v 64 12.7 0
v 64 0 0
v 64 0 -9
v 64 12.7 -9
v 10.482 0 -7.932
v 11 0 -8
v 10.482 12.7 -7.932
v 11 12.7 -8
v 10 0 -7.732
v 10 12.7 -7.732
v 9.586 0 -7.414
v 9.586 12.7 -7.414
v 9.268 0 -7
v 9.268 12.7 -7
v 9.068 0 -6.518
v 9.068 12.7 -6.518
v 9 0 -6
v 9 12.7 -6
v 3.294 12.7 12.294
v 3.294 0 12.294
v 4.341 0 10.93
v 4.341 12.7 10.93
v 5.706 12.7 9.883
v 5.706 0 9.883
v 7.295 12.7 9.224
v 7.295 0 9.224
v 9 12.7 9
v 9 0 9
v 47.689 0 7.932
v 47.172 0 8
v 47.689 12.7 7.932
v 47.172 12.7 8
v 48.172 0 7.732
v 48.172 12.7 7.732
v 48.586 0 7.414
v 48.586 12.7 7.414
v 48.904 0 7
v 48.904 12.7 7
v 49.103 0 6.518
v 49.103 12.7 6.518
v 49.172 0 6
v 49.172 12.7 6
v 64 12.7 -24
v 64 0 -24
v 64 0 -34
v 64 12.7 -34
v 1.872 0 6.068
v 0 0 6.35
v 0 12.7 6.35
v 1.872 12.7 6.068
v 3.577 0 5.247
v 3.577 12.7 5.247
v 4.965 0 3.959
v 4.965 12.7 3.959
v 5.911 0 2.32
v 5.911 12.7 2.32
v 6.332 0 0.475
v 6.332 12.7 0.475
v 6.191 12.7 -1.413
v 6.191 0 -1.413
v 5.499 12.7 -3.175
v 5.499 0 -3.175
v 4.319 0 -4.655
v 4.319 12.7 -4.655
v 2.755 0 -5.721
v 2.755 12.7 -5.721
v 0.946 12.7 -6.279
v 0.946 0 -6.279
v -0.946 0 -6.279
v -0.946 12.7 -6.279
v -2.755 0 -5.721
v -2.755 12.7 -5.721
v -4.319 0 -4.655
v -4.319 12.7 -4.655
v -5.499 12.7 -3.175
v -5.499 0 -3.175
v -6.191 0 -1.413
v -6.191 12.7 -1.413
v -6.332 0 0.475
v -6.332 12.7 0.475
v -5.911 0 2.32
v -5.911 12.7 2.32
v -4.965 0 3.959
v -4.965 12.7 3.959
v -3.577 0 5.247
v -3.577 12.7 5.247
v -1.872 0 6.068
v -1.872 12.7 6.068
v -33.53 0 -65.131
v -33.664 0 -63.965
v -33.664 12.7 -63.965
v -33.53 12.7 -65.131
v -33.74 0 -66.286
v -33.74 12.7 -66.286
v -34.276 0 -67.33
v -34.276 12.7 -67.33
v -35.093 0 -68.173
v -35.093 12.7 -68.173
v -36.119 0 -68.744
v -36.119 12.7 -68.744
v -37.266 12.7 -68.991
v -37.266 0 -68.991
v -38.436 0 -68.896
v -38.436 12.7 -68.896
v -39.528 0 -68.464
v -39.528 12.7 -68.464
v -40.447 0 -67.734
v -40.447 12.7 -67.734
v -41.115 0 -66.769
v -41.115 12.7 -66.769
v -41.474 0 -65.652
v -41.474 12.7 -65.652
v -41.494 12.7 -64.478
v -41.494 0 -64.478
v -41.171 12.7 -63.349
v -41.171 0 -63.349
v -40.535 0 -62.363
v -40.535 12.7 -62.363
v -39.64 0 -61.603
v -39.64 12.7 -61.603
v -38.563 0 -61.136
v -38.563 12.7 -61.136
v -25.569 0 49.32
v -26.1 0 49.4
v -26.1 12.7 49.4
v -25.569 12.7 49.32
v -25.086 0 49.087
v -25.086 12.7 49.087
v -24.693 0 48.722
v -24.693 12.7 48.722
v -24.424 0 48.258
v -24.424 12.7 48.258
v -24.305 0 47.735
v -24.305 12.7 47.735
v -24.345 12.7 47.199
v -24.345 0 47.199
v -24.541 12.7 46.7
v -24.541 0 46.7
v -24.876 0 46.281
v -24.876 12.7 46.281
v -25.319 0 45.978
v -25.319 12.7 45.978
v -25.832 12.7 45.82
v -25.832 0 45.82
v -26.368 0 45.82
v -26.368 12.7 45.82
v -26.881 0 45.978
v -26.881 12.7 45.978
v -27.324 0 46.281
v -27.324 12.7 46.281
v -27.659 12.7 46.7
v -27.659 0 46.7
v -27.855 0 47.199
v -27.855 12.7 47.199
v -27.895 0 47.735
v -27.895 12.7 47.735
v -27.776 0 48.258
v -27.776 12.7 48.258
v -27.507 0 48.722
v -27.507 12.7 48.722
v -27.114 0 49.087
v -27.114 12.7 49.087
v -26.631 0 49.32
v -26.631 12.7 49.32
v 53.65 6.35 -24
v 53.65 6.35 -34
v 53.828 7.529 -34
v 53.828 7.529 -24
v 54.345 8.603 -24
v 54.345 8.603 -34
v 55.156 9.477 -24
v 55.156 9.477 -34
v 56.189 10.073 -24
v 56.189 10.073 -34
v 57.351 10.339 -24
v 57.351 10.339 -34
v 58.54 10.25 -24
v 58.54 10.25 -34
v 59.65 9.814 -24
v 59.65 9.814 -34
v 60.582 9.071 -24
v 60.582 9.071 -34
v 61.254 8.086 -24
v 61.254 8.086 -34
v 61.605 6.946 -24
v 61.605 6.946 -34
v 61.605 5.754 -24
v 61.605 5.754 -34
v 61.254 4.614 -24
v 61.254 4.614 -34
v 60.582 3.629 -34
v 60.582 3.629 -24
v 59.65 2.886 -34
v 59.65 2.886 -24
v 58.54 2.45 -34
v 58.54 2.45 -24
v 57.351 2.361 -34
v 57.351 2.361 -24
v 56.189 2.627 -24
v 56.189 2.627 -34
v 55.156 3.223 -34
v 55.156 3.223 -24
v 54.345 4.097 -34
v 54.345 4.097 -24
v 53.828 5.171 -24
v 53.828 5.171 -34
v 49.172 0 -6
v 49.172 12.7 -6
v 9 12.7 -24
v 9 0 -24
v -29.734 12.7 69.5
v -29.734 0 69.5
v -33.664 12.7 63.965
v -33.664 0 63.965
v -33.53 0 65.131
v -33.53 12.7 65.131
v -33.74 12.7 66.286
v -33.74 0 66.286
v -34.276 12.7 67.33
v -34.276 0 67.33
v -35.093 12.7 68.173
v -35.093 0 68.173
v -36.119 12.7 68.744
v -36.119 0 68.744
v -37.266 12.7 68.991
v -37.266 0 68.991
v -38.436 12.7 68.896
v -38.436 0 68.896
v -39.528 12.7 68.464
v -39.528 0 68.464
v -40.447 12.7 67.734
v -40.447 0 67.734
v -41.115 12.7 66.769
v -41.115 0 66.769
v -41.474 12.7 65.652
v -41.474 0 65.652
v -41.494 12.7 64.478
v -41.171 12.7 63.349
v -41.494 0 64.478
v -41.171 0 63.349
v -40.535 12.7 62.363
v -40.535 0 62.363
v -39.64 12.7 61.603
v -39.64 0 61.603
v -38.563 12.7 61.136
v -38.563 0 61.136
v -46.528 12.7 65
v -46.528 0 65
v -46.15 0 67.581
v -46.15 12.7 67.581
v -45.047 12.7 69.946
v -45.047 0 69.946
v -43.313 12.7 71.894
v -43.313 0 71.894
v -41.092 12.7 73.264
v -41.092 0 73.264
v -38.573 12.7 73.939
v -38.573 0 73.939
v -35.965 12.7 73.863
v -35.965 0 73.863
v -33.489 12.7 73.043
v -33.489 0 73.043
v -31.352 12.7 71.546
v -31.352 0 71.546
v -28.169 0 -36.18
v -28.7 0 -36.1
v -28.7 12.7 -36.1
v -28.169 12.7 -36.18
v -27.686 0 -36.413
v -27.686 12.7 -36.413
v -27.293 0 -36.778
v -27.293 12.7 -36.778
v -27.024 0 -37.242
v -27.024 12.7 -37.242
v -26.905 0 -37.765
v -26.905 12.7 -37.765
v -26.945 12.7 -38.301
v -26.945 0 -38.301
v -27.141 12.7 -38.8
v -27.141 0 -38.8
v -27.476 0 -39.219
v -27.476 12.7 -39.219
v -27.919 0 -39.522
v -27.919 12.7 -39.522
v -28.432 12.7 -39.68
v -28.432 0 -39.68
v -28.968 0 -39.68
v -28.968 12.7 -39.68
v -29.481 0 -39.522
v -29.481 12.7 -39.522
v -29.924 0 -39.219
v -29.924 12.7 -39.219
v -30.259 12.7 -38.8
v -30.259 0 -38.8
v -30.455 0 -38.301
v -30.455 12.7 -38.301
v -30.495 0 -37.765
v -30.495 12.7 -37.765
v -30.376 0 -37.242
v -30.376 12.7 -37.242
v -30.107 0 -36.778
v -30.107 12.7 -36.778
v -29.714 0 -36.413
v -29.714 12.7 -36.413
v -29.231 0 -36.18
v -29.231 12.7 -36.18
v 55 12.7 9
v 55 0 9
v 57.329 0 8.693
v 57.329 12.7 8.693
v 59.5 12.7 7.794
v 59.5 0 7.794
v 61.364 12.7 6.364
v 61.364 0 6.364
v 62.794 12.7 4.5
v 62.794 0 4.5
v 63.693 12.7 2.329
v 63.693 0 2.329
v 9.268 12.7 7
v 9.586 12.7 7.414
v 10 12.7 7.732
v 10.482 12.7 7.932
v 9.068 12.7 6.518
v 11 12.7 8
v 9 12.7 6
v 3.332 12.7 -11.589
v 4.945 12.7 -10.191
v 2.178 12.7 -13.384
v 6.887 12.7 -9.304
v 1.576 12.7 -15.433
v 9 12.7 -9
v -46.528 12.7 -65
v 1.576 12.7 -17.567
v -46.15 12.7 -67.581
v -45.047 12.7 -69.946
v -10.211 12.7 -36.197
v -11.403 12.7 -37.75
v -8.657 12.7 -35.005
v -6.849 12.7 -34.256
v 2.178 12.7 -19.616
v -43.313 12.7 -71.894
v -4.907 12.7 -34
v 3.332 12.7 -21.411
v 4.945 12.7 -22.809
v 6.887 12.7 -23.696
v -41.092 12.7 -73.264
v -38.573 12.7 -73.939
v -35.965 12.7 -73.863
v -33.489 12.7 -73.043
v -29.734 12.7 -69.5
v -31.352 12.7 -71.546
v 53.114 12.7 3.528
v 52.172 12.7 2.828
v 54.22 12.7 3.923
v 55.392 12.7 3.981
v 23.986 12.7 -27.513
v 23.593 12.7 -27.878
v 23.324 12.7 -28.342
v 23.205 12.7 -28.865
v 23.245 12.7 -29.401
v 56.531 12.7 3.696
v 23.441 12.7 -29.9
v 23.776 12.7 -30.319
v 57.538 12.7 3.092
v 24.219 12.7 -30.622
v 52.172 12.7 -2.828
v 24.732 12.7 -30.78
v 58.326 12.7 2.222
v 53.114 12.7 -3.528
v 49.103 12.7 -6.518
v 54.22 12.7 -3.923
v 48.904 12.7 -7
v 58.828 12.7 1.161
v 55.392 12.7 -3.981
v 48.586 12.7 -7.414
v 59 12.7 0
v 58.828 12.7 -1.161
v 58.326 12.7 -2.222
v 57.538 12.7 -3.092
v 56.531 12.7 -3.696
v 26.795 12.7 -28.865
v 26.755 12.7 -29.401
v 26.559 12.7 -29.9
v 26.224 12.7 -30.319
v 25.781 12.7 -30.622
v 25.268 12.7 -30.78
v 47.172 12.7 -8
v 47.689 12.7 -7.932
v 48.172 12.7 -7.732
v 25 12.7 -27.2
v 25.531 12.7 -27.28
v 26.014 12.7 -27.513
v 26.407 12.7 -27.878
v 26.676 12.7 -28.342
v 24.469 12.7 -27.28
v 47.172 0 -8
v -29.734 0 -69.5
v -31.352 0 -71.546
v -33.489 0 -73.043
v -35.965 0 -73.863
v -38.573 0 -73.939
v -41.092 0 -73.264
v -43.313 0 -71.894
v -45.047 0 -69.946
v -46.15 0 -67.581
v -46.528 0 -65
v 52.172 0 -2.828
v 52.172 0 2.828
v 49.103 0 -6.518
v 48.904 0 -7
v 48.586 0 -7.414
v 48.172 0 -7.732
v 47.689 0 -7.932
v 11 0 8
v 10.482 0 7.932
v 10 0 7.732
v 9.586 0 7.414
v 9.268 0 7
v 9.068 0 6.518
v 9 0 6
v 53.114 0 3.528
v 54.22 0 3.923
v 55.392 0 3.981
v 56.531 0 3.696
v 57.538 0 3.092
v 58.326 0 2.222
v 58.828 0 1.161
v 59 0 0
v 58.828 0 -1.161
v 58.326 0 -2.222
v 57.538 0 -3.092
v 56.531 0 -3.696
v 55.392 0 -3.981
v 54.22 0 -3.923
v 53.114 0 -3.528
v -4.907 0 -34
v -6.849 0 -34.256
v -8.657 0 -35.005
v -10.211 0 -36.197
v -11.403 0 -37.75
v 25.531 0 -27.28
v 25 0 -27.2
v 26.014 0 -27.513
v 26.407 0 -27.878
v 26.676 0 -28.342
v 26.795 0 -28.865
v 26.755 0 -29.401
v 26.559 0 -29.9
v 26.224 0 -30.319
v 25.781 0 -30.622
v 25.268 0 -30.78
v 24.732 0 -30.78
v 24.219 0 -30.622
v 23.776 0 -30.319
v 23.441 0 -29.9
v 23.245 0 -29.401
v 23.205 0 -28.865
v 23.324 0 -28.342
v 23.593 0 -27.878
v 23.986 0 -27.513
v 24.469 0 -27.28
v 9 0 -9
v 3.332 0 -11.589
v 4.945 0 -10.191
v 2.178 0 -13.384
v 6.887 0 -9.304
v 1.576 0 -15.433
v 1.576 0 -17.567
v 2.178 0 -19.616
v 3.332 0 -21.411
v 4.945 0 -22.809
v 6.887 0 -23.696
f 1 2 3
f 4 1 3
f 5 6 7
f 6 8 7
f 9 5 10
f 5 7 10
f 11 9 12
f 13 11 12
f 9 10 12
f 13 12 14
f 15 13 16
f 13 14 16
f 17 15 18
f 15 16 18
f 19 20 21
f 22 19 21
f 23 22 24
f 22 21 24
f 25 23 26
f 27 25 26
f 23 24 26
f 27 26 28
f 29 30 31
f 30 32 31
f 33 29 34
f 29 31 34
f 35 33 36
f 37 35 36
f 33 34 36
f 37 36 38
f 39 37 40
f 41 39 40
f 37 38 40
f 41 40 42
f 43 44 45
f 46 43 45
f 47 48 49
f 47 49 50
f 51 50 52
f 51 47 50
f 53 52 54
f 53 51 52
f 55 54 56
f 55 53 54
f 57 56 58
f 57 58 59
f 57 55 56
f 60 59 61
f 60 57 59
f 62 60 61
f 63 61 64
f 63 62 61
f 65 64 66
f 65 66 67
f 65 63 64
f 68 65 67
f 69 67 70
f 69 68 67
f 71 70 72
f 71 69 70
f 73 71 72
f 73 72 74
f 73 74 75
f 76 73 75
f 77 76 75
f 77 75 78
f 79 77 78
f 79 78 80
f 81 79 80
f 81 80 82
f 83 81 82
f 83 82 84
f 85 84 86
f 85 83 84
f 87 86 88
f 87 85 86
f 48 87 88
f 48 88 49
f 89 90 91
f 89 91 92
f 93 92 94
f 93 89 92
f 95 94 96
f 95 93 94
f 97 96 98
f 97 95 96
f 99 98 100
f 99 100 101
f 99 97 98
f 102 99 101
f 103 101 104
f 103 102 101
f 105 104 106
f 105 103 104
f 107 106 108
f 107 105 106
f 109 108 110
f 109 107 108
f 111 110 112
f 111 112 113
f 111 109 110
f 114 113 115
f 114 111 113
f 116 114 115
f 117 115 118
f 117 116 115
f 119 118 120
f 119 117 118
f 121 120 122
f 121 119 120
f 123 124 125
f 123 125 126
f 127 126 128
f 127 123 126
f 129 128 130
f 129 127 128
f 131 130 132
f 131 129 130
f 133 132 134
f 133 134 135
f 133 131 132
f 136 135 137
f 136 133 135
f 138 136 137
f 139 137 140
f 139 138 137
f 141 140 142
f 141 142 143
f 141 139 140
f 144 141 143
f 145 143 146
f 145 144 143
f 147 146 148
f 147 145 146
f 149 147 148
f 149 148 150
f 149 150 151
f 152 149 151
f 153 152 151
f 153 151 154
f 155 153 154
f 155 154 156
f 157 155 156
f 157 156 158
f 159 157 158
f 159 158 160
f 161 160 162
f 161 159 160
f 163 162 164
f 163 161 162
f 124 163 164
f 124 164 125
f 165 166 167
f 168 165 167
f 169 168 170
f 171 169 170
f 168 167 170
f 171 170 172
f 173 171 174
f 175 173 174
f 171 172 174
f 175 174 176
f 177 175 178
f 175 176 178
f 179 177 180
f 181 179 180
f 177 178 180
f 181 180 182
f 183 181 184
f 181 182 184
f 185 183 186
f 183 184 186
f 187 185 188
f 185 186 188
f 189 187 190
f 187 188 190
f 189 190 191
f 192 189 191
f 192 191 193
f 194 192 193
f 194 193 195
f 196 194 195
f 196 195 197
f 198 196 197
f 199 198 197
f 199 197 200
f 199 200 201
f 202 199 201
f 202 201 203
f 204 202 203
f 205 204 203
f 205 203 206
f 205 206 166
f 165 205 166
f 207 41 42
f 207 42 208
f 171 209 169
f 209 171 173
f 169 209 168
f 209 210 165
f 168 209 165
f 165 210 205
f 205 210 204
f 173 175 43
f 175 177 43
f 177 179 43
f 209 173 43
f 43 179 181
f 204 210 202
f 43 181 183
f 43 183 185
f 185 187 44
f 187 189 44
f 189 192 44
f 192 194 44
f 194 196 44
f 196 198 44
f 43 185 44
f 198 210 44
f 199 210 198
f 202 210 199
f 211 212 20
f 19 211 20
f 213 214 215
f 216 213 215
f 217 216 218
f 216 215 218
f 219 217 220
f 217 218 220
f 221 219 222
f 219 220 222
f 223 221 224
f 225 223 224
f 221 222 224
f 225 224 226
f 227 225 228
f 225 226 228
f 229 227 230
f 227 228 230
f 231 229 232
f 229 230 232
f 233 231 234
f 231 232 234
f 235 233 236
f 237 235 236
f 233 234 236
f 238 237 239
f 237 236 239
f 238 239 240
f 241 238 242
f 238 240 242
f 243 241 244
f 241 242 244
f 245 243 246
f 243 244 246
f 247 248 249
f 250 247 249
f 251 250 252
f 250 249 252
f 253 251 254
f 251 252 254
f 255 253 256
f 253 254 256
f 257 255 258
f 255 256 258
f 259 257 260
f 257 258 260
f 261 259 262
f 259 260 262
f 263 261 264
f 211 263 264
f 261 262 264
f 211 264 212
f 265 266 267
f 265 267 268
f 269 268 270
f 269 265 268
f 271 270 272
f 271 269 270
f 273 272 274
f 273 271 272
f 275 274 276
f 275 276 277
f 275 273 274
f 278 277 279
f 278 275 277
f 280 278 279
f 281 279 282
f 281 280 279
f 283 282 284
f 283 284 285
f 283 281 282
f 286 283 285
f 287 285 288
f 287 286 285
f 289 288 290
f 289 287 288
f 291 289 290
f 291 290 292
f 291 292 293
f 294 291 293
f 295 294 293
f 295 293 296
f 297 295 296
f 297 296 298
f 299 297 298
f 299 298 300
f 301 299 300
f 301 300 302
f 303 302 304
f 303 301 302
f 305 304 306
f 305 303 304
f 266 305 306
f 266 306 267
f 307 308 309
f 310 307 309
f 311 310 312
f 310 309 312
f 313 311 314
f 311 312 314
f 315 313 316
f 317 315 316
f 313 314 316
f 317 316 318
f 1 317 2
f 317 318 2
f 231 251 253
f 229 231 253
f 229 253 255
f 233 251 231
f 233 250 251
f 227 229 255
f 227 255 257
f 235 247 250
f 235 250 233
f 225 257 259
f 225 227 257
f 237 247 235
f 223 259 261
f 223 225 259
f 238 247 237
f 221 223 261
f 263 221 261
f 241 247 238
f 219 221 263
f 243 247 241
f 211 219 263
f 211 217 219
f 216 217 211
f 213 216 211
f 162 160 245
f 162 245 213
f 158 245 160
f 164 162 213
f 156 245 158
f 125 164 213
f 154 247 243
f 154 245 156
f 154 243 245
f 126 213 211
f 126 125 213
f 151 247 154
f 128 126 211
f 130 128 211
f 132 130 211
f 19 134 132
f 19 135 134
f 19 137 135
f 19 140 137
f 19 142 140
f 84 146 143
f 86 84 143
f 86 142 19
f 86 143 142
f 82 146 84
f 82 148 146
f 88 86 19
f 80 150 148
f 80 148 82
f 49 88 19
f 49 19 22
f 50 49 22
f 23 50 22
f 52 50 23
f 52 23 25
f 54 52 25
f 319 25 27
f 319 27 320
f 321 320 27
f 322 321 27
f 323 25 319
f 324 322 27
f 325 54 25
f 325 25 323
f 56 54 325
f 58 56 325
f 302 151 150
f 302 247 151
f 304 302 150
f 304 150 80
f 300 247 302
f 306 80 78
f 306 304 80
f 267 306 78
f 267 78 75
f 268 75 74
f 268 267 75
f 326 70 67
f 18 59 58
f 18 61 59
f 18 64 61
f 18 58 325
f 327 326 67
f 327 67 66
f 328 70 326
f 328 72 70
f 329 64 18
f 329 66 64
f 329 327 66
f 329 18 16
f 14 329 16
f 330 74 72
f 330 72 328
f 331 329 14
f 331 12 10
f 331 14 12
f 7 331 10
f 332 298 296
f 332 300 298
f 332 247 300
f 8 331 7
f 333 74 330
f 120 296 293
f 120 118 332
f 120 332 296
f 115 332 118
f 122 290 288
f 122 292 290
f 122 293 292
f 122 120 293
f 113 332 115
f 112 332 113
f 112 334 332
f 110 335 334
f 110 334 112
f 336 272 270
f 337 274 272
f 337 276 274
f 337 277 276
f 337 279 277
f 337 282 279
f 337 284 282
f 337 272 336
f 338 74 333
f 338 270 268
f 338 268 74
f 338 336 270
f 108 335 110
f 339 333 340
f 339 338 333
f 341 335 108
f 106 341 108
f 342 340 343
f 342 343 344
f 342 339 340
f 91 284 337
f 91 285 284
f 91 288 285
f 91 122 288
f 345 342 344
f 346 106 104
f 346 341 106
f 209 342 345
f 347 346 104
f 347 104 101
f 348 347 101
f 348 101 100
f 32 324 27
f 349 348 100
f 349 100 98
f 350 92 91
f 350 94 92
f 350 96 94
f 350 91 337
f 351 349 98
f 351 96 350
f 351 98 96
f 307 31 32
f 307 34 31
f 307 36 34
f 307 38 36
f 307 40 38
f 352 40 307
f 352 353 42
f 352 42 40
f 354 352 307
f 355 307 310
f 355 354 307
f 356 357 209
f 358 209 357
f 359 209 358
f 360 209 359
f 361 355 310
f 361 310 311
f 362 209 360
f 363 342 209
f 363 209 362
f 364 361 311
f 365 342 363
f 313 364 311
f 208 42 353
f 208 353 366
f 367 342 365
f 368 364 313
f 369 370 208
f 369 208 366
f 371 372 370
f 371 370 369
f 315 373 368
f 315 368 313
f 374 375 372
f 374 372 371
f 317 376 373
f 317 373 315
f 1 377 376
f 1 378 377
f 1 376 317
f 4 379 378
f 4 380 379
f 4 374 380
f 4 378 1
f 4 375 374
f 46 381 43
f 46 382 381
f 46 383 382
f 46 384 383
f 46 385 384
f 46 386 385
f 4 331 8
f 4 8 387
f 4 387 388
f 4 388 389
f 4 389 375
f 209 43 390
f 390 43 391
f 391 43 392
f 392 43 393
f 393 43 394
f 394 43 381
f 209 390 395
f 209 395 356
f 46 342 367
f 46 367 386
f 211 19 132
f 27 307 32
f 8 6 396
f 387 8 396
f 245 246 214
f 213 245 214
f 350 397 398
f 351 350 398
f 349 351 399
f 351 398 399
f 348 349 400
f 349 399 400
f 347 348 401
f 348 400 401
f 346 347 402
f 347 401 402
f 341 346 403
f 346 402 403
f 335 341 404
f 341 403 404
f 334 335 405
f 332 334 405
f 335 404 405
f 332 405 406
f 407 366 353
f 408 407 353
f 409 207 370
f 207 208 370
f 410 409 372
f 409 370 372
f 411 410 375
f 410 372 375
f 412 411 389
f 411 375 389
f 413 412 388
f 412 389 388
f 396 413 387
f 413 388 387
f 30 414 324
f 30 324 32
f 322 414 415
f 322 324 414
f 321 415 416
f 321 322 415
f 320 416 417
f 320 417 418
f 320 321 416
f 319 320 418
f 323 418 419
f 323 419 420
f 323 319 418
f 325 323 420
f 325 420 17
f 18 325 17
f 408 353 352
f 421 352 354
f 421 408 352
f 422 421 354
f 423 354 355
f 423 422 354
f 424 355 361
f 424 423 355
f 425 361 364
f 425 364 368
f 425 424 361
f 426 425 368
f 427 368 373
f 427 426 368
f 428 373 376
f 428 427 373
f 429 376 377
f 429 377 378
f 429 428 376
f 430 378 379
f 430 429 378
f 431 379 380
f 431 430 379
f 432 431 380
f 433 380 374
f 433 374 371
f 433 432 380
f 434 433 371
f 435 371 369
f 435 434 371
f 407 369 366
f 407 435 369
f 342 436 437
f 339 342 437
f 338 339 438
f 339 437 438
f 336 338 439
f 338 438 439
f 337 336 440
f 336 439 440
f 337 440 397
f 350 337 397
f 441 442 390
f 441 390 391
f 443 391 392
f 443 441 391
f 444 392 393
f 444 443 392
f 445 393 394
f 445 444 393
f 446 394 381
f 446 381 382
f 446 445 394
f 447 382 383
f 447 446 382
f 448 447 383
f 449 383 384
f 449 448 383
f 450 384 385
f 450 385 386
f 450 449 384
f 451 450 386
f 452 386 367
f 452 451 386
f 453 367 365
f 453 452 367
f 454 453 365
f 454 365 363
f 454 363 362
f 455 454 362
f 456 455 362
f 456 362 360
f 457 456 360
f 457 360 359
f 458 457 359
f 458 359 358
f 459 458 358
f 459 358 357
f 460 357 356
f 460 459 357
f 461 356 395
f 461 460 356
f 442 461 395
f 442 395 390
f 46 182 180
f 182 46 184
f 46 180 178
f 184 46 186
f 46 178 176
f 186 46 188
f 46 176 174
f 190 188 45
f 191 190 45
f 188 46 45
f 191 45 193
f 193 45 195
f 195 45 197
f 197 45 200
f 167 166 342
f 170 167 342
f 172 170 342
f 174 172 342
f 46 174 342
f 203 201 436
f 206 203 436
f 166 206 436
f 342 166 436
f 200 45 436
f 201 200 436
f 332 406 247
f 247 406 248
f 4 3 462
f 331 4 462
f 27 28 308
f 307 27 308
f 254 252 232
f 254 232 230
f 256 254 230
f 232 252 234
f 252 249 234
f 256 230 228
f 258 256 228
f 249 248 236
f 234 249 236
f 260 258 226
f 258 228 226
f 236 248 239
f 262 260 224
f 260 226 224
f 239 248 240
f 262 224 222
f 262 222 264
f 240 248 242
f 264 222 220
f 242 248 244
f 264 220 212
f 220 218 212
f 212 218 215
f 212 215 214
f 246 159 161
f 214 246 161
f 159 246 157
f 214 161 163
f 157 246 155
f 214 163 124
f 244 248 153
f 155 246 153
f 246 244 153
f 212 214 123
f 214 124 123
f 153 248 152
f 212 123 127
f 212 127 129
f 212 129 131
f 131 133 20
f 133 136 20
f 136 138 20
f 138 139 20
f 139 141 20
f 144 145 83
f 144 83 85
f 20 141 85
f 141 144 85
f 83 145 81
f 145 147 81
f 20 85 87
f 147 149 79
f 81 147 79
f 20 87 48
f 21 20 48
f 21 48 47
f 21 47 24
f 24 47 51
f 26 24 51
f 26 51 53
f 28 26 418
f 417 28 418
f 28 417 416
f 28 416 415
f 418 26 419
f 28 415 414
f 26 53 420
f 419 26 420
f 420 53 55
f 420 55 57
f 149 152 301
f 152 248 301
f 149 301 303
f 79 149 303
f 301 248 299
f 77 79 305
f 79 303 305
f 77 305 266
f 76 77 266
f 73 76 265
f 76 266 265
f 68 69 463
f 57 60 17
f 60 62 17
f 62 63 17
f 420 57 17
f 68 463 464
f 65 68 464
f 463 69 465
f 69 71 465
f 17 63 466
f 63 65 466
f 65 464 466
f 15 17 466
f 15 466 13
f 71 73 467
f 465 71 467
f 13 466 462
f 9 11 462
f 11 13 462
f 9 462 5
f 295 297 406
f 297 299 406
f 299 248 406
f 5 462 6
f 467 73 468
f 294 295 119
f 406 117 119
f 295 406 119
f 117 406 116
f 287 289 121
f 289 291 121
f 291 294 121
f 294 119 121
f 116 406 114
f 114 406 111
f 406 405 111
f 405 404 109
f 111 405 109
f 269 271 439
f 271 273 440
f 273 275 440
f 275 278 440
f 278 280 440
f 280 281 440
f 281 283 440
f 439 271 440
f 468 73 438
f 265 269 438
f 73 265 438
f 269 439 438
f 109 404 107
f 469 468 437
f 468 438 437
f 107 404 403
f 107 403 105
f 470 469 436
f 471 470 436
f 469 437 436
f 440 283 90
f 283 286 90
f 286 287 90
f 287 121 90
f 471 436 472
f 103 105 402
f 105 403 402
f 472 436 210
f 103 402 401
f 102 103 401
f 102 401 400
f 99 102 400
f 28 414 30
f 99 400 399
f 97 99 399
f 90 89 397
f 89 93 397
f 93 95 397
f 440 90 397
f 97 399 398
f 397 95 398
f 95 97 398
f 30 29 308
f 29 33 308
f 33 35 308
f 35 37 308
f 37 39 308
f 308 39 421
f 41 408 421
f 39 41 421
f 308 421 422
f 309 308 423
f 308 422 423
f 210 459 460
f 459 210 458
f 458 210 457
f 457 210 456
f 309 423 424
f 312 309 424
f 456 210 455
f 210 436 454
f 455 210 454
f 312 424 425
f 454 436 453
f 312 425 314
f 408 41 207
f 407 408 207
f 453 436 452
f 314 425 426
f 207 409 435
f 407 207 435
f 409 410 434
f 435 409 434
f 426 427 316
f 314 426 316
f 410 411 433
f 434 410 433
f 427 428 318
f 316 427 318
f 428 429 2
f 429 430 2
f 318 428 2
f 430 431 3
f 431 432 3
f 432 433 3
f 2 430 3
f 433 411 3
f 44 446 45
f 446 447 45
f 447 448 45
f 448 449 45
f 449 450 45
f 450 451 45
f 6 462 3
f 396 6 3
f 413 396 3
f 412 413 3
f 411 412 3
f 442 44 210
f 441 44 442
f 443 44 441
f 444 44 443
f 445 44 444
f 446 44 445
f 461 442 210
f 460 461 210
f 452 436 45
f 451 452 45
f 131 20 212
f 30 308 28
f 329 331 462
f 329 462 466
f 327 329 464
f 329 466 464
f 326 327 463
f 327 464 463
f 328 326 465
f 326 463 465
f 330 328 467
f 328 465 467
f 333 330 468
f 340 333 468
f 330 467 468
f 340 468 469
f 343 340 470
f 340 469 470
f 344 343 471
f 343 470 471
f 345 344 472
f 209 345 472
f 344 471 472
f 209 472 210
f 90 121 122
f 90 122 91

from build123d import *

# Parameters (mm, degrees)
SKETCH1_R           = 6.35
SKETCH1_R_2         = 1.8
SKETCH1_W           = 40.171572875
SKETCH1_H           = 16
BOSS_EXTRUDE1_DEPTH = 12.7
FILLET1_R           = 2
CUT_EXTRUDE1_REACH  = 128.18
SKETCH2_R           = 4


with BuildPart() as part:
    # Sketch1 → Boss-Extrude1 (new body)
    with BuildSketch(Plane(origin=(0, 0, 0), x_dir=(1, 0, 0), z_dir=(0, 1, 0))):
        with BuildLine():
            Line((64, 0), (64, 9))
            Line((64, 9), (9, 9))
            ThreePointArc((9, 9), (1.5, 16.5), (9, 24))
            Line((9, 24), (64, 24))
            Line((64, 24), (64, 34))
            Line((64, 34), (-4.907477288, 34))
            ThreePointArc((-4.907477288, 34), (-8.657477288, 35.004809472), (-11.402667816, 37.75))
            Line((-11.402667816, 37.75), (-29.733538863, 69.5))
            ThreePointArc((-29.733538863, 69.5), (-39.857138903, 73.693332437), (-46.527767497, 65))
            Line((-46.527767497, 65), (-46.527767497, -65))
            ThreePointArc((-46.527767497, -65), (-39.857138903, -73.693332437), (-29.733538863, -69.5))
            Line((-29.733538863, -69.5), (3.294228634, -12.294228634))
            ThreePointArc((3.294228634, -12.294228634), (5.705771366, -9.882685902), (9, -9))
            Line((9, -9), (55, -9))
            ThreePointArc((55, -9), (61.363961031, -6.363961031), (64, 0))
        make_face()
        with Locations(Location((0, 0, 0), (0, 0, 270))):
            Circle(SKETCH1_R, mode=Mode.SUBTRACT)
        with Locations(Location((25, 29, 0), (0, 0, 270))):
            Circle(SKETCH1_R_2, mode=Mode.SUBTRACT)
        with Locations(Location((-28.7, 37.9, 0), (0, 0, 270))):
            Circle(SKETCH1_R_2, mode=Mode.SUBTRACT)
        with Locations(Location((-26.1, -47.6, 0), (0, 0, 270))):
            Circle(SKETCH1_R_2, mode=Mode.SUBTRACT)
        with BuildLine():
            Line((52.171572875, 2.828427125), (52.171572875, -2.828427125))
            ThreePointArc((52.171572875, -2.828427125), (59, 0), (52.171572875, 2.828427125))
        make_face(mode=Mode.SUBTRACT)
        with BuildLine():
            Line((-38.563043678, 61.136296695), (-33.664064192, 63.96472382))
            ThreePointArc((-33.664064192, 63.96472382), (-39.527767497, 68.464101615), (-38.563043678, 61.136296695))
        make_face(mode=Mode.SUBTRACT)
        with BuildLine():
            Line((-38.563043678, -61.136296695), (-33.664064192, -63.96472382))
            ThreePointArc((-33.664064192, -63.96472382), (-39.527767497, -68.464101615), (-38.563043678, -61.136296695))
        make_face(mode=Mode.SUBTRACT)
        with Locations((29.085786438, 0)):
            Rectangle(SKETCH1_W, SKETCH1_H, mode=Mode.SUBTRACT)
    extrude(amount=BOSS_EXTRUDE1_DEPTH)

    # Fillet1
    fillet1_edges = [part.edges().sort_by_distance(p)[0] for p in [
        (9, 6.35, -8),
        (9, 6.35, 8),
        (49.171572875, 6.35, 8),
        (49.171572875, 6.35, -8),
    ]]
    fillet(fillet1_edges, radius=FILLET1_R)

    # Sketch2 → Cut-Extrude1 (cut, up to next)
    with BuildSketch(Plane(origin=(0, 0, -34), x_dir=(-1, 0, 0), z_dir=(0, 0, -1)), mode=Mode.PRIVATE) as cut_extrude1_sk1:
        with Locations((-57.65, 6.35)):
            Circle(SKETCH2_R)
    cut_extrude1_tool1 = extrude(cut_extrude1_sk1.sketch, amount=-CUT_EXTRUDE1_REACH, mode=Mode.PRIVATE) & part.part
    add(cut_extrude1_tool1.solids().sort_by_distance((57.65, 6.35, -34))[0], mode=Mode.SUBTRACT)


solid = part.part
